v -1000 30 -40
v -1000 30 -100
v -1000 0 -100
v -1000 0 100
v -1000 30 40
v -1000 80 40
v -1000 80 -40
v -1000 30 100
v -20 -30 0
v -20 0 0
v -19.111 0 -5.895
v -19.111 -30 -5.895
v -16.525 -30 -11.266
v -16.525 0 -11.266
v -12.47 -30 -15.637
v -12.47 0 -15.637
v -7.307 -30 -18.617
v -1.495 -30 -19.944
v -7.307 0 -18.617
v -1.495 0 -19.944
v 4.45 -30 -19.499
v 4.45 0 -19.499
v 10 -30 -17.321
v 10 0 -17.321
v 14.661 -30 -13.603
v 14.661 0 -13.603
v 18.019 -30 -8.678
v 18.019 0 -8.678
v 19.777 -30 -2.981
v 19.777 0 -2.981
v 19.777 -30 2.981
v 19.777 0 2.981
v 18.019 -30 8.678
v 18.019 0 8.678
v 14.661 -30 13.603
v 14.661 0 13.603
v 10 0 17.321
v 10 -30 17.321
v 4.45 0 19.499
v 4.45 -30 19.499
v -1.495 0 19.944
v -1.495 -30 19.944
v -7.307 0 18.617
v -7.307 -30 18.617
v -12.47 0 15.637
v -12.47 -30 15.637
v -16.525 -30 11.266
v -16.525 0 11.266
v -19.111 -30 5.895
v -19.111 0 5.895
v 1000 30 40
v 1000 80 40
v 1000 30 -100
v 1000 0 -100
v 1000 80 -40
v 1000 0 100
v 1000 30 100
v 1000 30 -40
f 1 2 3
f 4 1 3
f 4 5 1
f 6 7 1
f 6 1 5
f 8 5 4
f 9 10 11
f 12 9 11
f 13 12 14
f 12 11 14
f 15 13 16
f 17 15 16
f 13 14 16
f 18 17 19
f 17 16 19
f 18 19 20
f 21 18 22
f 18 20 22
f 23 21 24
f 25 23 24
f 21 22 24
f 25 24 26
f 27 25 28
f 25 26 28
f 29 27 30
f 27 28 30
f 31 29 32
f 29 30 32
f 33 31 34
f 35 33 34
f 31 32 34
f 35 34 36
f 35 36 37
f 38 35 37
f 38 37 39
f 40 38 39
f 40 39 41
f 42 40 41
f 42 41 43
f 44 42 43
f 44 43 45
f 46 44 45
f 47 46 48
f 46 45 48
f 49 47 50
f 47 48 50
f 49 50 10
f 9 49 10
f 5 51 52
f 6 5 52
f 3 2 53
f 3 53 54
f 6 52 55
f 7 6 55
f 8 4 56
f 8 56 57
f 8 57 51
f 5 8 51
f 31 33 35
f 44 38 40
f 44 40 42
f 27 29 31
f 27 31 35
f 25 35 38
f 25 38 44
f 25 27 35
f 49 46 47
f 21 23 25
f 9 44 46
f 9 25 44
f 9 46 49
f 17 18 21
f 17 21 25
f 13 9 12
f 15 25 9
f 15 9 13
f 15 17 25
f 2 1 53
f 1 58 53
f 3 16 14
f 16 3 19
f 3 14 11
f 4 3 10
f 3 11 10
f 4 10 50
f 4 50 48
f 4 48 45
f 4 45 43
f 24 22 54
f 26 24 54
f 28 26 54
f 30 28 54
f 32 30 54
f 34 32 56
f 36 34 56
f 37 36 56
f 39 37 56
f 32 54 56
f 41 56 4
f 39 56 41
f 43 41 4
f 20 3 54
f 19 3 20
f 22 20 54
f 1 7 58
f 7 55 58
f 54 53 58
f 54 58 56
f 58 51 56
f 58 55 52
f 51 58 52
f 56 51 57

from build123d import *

# Parameters (mm, degrees)
RESSALTO_EXTRUS_O1_DEPTH = 1000
ESBO_O2_R                = 20
RESSALTO_EXTRUS_O2_DEPTH = 30


with BuildPart() as part:
    # Esboço1 → Ressalto-extrusão1 (new body, symmetric)
    with BuildSketch(Plane(origin=(0, 0, 0), x_dir=(0, 0, -1), z_dir=(1, 0, 0))):
        Polygon((-40, 80), (40, 80), (40, 30), (100, 30), (100, 0), (-100, 0), (-100, 30), (-40, 30), align=None)
    extrude(amount=RESSALTO_EXTRUS_O1_DEPTH, both=True)

    # Esboço2 → Ressalto-extrusão2 (add)
    with BuildSketch(Plane(origin=(0, 0, 0), x_dir=(-1, 0, 0), z_dir=(0, -1, 0))):
        Circle(ESBO_O2_R)
    extrude(amount=RESSALTO_EXTRUS_O2_DEPTH)


solid = part.part
